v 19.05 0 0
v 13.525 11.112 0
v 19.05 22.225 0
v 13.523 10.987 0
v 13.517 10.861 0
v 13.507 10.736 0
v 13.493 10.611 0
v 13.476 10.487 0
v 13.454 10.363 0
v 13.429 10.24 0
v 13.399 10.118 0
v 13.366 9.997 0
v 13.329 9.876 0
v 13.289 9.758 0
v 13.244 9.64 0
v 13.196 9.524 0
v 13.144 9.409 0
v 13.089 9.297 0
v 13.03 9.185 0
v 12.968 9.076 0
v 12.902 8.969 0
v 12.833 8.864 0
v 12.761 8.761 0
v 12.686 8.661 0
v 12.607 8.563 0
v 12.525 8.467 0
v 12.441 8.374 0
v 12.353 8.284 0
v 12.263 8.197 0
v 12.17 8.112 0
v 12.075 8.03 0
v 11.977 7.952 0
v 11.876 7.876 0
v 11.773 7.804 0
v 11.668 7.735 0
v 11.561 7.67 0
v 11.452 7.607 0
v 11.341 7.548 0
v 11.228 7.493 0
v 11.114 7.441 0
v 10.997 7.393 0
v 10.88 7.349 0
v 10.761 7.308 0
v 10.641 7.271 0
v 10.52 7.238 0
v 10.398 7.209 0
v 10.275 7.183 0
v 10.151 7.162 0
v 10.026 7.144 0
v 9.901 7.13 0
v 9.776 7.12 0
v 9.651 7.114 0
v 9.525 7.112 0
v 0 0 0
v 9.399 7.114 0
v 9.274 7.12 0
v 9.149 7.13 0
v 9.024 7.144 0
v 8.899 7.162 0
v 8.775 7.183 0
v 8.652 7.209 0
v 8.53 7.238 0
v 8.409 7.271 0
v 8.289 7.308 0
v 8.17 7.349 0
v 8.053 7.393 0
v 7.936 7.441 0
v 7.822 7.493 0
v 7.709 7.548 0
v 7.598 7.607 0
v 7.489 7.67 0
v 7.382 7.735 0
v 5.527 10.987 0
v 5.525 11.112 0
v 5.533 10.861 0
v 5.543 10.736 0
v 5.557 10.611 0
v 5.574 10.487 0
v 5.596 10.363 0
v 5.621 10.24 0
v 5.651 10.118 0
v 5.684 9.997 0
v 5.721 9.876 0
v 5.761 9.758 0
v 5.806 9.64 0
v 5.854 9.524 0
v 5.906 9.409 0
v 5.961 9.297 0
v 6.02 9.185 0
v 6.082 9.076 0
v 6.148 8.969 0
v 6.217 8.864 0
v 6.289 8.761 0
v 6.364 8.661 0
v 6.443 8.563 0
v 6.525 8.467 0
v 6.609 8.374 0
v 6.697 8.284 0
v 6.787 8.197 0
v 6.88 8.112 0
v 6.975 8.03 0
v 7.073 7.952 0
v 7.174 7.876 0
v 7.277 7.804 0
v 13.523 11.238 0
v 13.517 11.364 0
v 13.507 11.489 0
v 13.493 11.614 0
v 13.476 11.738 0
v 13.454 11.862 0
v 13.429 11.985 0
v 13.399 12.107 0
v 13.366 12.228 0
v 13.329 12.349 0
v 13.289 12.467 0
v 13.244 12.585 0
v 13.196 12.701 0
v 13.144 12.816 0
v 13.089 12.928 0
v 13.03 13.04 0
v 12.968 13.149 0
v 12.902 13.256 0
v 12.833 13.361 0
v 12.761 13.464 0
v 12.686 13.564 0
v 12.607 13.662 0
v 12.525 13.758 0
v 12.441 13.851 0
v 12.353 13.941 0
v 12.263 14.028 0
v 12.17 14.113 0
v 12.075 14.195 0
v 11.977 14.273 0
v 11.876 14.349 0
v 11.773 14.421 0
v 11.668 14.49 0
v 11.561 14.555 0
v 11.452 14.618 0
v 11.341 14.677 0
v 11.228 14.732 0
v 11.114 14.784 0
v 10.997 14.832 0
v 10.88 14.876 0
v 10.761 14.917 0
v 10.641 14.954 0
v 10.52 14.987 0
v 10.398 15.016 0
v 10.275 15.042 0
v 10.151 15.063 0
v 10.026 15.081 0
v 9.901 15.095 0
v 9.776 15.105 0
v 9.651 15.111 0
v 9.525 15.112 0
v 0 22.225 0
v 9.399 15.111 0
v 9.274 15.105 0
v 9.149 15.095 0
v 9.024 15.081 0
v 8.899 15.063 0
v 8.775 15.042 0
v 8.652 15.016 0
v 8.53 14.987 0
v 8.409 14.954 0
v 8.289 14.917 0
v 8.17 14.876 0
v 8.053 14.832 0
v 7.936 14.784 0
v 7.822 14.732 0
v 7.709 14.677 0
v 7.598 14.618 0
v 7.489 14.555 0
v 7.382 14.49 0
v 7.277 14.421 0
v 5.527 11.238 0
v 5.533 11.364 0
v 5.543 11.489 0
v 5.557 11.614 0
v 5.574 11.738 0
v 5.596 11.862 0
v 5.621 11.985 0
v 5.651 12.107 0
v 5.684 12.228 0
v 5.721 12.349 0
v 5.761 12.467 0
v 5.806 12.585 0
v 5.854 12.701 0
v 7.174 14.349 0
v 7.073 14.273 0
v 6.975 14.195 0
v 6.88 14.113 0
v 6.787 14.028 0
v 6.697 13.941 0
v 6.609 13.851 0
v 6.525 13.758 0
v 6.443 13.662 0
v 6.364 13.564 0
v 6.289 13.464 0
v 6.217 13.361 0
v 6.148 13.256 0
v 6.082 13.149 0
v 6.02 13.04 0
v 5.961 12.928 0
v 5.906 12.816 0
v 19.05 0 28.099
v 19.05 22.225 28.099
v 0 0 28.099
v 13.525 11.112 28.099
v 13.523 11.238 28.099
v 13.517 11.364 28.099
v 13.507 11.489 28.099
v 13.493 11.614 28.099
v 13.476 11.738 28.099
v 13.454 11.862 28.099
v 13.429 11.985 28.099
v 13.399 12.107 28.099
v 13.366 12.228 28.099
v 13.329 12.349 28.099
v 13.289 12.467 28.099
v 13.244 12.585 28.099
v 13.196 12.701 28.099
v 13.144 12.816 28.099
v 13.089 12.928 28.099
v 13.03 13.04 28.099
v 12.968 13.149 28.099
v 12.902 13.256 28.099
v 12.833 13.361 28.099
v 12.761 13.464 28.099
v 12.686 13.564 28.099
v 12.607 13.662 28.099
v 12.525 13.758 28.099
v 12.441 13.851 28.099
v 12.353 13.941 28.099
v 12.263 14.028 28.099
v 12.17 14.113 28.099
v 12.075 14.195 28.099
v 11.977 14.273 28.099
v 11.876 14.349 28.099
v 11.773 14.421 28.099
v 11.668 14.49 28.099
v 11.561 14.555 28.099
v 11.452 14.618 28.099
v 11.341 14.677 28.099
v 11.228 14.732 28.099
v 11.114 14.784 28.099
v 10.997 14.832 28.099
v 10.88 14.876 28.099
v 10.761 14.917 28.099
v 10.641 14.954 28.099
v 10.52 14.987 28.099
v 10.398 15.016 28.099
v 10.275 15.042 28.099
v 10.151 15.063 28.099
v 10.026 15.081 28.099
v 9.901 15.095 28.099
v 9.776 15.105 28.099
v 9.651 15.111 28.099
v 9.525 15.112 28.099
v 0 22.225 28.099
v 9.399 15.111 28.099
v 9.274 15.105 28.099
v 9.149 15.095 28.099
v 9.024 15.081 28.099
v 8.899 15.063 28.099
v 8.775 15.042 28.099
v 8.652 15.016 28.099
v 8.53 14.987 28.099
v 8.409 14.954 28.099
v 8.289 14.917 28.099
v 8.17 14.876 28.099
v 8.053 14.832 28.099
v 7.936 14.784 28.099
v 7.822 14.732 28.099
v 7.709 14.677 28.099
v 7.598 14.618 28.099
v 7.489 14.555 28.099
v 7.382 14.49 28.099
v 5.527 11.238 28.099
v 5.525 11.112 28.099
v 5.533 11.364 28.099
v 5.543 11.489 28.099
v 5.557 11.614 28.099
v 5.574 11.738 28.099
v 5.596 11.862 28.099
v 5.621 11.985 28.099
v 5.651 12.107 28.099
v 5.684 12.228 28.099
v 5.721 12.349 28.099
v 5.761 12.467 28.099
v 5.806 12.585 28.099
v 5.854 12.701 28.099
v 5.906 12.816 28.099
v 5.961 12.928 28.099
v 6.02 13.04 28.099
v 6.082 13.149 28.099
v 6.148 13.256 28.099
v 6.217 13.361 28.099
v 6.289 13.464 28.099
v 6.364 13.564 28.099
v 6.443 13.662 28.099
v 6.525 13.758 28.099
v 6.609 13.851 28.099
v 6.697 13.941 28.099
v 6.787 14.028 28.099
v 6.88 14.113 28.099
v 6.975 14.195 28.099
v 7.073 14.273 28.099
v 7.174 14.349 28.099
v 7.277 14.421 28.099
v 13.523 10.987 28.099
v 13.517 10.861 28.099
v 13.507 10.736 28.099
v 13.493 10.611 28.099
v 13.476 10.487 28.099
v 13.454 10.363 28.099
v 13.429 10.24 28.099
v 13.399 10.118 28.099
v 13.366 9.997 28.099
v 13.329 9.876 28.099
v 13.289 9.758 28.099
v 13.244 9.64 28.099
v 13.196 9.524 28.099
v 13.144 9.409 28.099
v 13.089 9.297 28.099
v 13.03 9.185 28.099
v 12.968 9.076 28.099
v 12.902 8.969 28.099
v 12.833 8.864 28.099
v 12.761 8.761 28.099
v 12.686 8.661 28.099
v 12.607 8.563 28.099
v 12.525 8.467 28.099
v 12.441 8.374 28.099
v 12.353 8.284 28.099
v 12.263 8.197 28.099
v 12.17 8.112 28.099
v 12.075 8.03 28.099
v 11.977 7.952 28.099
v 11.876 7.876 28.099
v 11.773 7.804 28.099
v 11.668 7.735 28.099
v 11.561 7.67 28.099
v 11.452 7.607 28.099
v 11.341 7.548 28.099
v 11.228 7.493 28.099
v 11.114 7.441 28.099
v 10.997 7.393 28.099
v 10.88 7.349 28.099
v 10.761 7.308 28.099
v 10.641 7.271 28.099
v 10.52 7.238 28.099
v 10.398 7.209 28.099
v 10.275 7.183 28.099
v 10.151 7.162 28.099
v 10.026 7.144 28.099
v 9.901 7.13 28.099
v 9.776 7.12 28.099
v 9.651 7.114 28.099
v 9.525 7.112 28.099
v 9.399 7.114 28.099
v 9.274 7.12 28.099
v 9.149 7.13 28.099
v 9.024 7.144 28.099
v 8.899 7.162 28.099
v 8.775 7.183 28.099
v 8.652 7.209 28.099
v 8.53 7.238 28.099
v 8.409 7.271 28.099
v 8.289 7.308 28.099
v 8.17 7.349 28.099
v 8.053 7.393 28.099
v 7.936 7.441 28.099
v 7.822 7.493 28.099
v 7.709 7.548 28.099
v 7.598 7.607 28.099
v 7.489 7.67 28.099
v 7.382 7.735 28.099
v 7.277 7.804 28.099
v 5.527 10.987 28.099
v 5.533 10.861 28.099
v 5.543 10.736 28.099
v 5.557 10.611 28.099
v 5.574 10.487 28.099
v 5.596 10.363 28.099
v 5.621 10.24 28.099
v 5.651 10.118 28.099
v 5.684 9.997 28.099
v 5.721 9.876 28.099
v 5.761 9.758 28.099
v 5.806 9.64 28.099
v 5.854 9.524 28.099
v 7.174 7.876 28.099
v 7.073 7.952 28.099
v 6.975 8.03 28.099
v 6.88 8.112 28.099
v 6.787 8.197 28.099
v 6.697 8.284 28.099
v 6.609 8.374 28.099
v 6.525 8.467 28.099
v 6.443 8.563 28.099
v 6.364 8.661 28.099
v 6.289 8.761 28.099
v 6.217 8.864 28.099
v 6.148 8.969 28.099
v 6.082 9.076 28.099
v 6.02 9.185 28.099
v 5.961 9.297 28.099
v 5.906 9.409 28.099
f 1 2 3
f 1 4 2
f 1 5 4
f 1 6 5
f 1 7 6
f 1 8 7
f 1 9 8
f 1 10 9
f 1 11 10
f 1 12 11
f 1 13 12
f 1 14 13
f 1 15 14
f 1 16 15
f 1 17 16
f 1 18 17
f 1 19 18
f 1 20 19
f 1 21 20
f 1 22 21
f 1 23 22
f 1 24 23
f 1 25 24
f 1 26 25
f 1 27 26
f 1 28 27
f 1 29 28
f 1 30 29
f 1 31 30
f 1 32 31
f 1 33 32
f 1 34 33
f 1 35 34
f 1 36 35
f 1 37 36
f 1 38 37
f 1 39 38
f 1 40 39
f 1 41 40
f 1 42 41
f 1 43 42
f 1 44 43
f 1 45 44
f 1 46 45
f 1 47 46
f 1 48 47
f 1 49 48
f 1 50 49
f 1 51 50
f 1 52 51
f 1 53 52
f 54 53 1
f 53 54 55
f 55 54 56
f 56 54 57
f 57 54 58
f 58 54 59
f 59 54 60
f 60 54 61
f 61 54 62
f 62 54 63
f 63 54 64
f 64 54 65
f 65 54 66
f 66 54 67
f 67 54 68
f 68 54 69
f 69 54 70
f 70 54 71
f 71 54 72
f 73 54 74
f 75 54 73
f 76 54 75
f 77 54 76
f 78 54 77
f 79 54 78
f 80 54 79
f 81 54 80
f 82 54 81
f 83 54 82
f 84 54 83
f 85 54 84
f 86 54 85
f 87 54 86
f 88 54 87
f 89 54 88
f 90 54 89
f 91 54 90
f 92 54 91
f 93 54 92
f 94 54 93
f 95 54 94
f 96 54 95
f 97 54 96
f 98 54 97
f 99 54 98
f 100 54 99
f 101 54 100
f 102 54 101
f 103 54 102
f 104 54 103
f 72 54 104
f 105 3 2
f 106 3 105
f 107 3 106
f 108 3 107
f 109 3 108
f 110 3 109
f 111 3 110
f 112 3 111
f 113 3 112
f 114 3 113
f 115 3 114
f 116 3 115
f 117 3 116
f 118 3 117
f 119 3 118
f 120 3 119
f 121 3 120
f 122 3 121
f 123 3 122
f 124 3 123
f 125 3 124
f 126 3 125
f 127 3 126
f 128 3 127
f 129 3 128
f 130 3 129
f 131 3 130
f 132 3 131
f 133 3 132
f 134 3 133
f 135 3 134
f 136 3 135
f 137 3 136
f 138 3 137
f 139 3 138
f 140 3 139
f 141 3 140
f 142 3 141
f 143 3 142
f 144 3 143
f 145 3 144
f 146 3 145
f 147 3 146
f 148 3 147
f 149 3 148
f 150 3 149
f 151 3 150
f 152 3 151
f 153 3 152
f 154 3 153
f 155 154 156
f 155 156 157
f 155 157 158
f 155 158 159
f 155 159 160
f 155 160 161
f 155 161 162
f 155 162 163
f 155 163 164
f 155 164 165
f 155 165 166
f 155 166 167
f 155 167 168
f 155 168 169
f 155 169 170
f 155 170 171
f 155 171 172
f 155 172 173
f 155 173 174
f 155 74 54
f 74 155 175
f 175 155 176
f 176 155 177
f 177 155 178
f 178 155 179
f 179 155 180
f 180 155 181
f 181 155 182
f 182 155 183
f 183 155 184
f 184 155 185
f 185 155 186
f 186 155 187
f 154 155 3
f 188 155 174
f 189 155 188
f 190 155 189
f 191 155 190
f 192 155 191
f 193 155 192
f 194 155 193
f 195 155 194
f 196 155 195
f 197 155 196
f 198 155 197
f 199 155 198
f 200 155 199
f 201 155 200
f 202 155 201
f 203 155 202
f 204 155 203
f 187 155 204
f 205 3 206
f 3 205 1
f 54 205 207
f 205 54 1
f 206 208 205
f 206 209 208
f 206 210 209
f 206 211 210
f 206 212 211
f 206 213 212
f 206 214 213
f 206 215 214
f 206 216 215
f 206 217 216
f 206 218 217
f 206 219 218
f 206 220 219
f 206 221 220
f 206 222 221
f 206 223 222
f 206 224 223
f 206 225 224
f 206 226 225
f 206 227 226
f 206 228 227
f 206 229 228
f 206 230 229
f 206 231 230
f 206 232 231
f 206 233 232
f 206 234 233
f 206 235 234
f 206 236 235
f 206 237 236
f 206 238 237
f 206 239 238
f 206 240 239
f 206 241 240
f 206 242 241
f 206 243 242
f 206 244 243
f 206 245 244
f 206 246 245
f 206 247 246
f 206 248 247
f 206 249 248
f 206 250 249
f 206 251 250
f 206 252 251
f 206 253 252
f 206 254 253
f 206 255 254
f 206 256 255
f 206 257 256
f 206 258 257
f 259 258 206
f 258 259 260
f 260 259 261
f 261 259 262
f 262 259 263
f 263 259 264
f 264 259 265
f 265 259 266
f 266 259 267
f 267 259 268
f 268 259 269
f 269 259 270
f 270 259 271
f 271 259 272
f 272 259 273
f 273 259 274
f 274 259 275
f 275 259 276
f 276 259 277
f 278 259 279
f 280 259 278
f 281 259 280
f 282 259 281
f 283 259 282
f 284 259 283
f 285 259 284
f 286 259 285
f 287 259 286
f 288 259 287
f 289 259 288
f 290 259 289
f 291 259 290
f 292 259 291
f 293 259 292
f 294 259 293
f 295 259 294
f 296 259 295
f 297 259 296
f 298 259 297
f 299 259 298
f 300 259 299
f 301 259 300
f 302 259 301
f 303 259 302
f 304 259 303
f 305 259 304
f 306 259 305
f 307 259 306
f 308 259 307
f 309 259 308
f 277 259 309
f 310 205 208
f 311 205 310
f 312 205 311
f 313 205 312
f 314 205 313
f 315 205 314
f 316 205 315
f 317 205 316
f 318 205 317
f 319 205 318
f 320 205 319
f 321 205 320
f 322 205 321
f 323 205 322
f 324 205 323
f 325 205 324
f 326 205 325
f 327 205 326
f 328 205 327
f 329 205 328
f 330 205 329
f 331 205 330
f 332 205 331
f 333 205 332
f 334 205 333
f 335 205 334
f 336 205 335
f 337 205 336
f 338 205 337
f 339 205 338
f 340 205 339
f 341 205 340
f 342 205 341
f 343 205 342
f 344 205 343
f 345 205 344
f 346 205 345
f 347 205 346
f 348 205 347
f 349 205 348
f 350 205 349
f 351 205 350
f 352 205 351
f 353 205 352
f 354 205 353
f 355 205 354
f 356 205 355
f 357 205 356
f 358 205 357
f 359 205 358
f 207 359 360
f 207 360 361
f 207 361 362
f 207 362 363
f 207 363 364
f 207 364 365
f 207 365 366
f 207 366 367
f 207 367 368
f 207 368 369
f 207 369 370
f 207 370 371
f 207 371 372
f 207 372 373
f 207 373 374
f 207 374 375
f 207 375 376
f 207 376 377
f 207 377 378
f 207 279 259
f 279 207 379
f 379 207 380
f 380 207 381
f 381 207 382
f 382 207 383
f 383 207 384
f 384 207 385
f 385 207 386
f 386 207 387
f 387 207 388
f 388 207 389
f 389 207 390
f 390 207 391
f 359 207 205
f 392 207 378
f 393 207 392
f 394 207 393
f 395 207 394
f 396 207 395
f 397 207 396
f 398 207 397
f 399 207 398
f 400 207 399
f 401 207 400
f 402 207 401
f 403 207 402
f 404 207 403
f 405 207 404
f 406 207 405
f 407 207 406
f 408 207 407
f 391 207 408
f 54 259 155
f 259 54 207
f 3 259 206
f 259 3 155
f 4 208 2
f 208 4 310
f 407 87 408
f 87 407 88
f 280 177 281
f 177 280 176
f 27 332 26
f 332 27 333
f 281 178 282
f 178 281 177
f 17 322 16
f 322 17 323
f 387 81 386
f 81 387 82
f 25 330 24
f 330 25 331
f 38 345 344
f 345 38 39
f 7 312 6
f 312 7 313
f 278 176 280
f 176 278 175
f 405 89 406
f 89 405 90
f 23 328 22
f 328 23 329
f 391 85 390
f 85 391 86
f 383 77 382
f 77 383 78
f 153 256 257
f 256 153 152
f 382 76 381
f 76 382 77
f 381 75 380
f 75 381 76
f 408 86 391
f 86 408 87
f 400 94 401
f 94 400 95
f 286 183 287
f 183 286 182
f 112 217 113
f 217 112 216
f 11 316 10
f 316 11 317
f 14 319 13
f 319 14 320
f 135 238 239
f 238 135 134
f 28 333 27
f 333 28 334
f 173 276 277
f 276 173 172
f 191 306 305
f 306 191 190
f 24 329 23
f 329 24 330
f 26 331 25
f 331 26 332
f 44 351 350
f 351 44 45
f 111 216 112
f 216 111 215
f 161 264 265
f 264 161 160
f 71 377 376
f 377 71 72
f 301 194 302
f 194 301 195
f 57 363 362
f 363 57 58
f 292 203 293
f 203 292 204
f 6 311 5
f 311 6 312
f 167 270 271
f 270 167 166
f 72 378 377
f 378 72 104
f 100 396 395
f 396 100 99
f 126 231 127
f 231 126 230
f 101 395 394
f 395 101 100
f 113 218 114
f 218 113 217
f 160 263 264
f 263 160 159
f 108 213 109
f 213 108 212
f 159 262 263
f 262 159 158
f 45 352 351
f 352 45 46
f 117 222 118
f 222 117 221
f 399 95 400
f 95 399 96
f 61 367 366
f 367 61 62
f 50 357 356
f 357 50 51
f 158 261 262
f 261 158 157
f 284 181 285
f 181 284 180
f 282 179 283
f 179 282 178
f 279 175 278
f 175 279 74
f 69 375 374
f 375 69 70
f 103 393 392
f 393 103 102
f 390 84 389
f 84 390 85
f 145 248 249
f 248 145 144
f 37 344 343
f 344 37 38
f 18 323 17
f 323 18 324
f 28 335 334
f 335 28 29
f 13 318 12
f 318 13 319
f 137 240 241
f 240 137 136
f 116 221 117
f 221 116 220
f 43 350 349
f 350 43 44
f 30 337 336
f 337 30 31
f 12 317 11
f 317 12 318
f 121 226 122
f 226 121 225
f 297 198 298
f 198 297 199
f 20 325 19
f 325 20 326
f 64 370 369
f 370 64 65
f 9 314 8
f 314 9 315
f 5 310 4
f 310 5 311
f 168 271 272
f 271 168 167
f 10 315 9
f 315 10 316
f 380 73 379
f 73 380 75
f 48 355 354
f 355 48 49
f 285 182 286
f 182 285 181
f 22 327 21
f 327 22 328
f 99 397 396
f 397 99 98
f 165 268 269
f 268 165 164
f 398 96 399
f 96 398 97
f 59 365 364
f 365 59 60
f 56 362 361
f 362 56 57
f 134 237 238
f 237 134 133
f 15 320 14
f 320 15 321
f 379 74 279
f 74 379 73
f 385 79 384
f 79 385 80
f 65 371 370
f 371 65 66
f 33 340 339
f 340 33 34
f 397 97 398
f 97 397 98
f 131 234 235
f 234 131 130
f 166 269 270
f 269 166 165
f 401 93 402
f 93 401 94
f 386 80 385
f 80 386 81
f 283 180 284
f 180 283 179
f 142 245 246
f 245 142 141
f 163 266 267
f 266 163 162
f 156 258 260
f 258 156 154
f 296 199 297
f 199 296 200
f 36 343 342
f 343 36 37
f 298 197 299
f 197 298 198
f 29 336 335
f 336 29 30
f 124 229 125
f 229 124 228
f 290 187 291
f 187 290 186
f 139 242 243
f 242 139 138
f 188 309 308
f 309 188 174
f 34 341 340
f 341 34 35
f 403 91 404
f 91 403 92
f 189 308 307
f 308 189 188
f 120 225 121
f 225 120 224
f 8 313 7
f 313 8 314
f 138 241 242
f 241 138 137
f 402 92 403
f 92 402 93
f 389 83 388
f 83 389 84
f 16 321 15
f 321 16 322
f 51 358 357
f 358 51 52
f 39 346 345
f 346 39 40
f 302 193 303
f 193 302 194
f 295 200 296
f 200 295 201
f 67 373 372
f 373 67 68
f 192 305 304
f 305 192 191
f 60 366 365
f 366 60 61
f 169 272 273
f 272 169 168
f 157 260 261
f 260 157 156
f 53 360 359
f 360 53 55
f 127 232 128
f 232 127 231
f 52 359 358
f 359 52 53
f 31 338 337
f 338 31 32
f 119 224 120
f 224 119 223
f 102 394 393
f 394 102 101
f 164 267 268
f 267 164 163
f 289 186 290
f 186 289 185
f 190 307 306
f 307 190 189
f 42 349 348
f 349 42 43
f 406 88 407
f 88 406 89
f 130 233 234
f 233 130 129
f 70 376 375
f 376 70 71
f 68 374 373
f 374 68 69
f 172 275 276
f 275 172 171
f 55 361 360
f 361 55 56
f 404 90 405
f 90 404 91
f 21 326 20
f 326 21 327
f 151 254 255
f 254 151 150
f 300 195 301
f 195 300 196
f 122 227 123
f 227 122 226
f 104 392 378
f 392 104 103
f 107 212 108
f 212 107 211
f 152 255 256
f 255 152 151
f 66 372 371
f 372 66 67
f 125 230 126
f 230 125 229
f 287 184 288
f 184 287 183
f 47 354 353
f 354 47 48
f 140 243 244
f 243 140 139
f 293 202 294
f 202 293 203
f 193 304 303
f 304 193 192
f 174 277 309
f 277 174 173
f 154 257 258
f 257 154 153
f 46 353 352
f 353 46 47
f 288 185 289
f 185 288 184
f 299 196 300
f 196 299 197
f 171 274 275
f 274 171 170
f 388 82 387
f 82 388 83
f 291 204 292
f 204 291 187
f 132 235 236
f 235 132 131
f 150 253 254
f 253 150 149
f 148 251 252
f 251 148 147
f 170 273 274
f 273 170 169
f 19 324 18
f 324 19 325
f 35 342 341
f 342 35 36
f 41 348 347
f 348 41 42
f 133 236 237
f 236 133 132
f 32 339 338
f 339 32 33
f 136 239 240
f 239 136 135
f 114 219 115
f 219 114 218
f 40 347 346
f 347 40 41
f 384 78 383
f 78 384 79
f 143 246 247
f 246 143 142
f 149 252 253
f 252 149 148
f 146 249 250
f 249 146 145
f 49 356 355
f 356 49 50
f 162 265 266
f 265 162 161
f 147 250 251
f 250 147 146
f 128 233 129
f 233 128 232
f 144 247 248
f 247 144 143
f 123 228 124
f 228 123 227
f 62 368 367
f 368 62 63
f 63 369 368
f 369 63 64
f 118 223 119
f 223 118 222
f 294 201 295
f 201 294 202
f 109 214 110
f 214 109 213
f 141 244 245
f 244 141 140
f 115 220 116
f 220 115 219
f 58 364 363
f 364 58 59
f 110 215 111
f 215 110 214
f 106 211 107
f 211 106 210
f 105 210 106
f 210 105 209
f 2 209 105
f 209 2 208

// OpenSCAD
width = 19.05;
depth = 22.225;
height = 1.475 * 19.05;
bolt = 8;

#difference()
{
linear_extrude(height = height )
{
	polygon(points=[[0, 0],[width, 0],[width, depth], [0, depth]]);

}

linear_extrude(height = height)
{
	translate([width/2, depth/2,0])
	{
		circle($fn = 200, r = bolt/2);
	}
}
}
